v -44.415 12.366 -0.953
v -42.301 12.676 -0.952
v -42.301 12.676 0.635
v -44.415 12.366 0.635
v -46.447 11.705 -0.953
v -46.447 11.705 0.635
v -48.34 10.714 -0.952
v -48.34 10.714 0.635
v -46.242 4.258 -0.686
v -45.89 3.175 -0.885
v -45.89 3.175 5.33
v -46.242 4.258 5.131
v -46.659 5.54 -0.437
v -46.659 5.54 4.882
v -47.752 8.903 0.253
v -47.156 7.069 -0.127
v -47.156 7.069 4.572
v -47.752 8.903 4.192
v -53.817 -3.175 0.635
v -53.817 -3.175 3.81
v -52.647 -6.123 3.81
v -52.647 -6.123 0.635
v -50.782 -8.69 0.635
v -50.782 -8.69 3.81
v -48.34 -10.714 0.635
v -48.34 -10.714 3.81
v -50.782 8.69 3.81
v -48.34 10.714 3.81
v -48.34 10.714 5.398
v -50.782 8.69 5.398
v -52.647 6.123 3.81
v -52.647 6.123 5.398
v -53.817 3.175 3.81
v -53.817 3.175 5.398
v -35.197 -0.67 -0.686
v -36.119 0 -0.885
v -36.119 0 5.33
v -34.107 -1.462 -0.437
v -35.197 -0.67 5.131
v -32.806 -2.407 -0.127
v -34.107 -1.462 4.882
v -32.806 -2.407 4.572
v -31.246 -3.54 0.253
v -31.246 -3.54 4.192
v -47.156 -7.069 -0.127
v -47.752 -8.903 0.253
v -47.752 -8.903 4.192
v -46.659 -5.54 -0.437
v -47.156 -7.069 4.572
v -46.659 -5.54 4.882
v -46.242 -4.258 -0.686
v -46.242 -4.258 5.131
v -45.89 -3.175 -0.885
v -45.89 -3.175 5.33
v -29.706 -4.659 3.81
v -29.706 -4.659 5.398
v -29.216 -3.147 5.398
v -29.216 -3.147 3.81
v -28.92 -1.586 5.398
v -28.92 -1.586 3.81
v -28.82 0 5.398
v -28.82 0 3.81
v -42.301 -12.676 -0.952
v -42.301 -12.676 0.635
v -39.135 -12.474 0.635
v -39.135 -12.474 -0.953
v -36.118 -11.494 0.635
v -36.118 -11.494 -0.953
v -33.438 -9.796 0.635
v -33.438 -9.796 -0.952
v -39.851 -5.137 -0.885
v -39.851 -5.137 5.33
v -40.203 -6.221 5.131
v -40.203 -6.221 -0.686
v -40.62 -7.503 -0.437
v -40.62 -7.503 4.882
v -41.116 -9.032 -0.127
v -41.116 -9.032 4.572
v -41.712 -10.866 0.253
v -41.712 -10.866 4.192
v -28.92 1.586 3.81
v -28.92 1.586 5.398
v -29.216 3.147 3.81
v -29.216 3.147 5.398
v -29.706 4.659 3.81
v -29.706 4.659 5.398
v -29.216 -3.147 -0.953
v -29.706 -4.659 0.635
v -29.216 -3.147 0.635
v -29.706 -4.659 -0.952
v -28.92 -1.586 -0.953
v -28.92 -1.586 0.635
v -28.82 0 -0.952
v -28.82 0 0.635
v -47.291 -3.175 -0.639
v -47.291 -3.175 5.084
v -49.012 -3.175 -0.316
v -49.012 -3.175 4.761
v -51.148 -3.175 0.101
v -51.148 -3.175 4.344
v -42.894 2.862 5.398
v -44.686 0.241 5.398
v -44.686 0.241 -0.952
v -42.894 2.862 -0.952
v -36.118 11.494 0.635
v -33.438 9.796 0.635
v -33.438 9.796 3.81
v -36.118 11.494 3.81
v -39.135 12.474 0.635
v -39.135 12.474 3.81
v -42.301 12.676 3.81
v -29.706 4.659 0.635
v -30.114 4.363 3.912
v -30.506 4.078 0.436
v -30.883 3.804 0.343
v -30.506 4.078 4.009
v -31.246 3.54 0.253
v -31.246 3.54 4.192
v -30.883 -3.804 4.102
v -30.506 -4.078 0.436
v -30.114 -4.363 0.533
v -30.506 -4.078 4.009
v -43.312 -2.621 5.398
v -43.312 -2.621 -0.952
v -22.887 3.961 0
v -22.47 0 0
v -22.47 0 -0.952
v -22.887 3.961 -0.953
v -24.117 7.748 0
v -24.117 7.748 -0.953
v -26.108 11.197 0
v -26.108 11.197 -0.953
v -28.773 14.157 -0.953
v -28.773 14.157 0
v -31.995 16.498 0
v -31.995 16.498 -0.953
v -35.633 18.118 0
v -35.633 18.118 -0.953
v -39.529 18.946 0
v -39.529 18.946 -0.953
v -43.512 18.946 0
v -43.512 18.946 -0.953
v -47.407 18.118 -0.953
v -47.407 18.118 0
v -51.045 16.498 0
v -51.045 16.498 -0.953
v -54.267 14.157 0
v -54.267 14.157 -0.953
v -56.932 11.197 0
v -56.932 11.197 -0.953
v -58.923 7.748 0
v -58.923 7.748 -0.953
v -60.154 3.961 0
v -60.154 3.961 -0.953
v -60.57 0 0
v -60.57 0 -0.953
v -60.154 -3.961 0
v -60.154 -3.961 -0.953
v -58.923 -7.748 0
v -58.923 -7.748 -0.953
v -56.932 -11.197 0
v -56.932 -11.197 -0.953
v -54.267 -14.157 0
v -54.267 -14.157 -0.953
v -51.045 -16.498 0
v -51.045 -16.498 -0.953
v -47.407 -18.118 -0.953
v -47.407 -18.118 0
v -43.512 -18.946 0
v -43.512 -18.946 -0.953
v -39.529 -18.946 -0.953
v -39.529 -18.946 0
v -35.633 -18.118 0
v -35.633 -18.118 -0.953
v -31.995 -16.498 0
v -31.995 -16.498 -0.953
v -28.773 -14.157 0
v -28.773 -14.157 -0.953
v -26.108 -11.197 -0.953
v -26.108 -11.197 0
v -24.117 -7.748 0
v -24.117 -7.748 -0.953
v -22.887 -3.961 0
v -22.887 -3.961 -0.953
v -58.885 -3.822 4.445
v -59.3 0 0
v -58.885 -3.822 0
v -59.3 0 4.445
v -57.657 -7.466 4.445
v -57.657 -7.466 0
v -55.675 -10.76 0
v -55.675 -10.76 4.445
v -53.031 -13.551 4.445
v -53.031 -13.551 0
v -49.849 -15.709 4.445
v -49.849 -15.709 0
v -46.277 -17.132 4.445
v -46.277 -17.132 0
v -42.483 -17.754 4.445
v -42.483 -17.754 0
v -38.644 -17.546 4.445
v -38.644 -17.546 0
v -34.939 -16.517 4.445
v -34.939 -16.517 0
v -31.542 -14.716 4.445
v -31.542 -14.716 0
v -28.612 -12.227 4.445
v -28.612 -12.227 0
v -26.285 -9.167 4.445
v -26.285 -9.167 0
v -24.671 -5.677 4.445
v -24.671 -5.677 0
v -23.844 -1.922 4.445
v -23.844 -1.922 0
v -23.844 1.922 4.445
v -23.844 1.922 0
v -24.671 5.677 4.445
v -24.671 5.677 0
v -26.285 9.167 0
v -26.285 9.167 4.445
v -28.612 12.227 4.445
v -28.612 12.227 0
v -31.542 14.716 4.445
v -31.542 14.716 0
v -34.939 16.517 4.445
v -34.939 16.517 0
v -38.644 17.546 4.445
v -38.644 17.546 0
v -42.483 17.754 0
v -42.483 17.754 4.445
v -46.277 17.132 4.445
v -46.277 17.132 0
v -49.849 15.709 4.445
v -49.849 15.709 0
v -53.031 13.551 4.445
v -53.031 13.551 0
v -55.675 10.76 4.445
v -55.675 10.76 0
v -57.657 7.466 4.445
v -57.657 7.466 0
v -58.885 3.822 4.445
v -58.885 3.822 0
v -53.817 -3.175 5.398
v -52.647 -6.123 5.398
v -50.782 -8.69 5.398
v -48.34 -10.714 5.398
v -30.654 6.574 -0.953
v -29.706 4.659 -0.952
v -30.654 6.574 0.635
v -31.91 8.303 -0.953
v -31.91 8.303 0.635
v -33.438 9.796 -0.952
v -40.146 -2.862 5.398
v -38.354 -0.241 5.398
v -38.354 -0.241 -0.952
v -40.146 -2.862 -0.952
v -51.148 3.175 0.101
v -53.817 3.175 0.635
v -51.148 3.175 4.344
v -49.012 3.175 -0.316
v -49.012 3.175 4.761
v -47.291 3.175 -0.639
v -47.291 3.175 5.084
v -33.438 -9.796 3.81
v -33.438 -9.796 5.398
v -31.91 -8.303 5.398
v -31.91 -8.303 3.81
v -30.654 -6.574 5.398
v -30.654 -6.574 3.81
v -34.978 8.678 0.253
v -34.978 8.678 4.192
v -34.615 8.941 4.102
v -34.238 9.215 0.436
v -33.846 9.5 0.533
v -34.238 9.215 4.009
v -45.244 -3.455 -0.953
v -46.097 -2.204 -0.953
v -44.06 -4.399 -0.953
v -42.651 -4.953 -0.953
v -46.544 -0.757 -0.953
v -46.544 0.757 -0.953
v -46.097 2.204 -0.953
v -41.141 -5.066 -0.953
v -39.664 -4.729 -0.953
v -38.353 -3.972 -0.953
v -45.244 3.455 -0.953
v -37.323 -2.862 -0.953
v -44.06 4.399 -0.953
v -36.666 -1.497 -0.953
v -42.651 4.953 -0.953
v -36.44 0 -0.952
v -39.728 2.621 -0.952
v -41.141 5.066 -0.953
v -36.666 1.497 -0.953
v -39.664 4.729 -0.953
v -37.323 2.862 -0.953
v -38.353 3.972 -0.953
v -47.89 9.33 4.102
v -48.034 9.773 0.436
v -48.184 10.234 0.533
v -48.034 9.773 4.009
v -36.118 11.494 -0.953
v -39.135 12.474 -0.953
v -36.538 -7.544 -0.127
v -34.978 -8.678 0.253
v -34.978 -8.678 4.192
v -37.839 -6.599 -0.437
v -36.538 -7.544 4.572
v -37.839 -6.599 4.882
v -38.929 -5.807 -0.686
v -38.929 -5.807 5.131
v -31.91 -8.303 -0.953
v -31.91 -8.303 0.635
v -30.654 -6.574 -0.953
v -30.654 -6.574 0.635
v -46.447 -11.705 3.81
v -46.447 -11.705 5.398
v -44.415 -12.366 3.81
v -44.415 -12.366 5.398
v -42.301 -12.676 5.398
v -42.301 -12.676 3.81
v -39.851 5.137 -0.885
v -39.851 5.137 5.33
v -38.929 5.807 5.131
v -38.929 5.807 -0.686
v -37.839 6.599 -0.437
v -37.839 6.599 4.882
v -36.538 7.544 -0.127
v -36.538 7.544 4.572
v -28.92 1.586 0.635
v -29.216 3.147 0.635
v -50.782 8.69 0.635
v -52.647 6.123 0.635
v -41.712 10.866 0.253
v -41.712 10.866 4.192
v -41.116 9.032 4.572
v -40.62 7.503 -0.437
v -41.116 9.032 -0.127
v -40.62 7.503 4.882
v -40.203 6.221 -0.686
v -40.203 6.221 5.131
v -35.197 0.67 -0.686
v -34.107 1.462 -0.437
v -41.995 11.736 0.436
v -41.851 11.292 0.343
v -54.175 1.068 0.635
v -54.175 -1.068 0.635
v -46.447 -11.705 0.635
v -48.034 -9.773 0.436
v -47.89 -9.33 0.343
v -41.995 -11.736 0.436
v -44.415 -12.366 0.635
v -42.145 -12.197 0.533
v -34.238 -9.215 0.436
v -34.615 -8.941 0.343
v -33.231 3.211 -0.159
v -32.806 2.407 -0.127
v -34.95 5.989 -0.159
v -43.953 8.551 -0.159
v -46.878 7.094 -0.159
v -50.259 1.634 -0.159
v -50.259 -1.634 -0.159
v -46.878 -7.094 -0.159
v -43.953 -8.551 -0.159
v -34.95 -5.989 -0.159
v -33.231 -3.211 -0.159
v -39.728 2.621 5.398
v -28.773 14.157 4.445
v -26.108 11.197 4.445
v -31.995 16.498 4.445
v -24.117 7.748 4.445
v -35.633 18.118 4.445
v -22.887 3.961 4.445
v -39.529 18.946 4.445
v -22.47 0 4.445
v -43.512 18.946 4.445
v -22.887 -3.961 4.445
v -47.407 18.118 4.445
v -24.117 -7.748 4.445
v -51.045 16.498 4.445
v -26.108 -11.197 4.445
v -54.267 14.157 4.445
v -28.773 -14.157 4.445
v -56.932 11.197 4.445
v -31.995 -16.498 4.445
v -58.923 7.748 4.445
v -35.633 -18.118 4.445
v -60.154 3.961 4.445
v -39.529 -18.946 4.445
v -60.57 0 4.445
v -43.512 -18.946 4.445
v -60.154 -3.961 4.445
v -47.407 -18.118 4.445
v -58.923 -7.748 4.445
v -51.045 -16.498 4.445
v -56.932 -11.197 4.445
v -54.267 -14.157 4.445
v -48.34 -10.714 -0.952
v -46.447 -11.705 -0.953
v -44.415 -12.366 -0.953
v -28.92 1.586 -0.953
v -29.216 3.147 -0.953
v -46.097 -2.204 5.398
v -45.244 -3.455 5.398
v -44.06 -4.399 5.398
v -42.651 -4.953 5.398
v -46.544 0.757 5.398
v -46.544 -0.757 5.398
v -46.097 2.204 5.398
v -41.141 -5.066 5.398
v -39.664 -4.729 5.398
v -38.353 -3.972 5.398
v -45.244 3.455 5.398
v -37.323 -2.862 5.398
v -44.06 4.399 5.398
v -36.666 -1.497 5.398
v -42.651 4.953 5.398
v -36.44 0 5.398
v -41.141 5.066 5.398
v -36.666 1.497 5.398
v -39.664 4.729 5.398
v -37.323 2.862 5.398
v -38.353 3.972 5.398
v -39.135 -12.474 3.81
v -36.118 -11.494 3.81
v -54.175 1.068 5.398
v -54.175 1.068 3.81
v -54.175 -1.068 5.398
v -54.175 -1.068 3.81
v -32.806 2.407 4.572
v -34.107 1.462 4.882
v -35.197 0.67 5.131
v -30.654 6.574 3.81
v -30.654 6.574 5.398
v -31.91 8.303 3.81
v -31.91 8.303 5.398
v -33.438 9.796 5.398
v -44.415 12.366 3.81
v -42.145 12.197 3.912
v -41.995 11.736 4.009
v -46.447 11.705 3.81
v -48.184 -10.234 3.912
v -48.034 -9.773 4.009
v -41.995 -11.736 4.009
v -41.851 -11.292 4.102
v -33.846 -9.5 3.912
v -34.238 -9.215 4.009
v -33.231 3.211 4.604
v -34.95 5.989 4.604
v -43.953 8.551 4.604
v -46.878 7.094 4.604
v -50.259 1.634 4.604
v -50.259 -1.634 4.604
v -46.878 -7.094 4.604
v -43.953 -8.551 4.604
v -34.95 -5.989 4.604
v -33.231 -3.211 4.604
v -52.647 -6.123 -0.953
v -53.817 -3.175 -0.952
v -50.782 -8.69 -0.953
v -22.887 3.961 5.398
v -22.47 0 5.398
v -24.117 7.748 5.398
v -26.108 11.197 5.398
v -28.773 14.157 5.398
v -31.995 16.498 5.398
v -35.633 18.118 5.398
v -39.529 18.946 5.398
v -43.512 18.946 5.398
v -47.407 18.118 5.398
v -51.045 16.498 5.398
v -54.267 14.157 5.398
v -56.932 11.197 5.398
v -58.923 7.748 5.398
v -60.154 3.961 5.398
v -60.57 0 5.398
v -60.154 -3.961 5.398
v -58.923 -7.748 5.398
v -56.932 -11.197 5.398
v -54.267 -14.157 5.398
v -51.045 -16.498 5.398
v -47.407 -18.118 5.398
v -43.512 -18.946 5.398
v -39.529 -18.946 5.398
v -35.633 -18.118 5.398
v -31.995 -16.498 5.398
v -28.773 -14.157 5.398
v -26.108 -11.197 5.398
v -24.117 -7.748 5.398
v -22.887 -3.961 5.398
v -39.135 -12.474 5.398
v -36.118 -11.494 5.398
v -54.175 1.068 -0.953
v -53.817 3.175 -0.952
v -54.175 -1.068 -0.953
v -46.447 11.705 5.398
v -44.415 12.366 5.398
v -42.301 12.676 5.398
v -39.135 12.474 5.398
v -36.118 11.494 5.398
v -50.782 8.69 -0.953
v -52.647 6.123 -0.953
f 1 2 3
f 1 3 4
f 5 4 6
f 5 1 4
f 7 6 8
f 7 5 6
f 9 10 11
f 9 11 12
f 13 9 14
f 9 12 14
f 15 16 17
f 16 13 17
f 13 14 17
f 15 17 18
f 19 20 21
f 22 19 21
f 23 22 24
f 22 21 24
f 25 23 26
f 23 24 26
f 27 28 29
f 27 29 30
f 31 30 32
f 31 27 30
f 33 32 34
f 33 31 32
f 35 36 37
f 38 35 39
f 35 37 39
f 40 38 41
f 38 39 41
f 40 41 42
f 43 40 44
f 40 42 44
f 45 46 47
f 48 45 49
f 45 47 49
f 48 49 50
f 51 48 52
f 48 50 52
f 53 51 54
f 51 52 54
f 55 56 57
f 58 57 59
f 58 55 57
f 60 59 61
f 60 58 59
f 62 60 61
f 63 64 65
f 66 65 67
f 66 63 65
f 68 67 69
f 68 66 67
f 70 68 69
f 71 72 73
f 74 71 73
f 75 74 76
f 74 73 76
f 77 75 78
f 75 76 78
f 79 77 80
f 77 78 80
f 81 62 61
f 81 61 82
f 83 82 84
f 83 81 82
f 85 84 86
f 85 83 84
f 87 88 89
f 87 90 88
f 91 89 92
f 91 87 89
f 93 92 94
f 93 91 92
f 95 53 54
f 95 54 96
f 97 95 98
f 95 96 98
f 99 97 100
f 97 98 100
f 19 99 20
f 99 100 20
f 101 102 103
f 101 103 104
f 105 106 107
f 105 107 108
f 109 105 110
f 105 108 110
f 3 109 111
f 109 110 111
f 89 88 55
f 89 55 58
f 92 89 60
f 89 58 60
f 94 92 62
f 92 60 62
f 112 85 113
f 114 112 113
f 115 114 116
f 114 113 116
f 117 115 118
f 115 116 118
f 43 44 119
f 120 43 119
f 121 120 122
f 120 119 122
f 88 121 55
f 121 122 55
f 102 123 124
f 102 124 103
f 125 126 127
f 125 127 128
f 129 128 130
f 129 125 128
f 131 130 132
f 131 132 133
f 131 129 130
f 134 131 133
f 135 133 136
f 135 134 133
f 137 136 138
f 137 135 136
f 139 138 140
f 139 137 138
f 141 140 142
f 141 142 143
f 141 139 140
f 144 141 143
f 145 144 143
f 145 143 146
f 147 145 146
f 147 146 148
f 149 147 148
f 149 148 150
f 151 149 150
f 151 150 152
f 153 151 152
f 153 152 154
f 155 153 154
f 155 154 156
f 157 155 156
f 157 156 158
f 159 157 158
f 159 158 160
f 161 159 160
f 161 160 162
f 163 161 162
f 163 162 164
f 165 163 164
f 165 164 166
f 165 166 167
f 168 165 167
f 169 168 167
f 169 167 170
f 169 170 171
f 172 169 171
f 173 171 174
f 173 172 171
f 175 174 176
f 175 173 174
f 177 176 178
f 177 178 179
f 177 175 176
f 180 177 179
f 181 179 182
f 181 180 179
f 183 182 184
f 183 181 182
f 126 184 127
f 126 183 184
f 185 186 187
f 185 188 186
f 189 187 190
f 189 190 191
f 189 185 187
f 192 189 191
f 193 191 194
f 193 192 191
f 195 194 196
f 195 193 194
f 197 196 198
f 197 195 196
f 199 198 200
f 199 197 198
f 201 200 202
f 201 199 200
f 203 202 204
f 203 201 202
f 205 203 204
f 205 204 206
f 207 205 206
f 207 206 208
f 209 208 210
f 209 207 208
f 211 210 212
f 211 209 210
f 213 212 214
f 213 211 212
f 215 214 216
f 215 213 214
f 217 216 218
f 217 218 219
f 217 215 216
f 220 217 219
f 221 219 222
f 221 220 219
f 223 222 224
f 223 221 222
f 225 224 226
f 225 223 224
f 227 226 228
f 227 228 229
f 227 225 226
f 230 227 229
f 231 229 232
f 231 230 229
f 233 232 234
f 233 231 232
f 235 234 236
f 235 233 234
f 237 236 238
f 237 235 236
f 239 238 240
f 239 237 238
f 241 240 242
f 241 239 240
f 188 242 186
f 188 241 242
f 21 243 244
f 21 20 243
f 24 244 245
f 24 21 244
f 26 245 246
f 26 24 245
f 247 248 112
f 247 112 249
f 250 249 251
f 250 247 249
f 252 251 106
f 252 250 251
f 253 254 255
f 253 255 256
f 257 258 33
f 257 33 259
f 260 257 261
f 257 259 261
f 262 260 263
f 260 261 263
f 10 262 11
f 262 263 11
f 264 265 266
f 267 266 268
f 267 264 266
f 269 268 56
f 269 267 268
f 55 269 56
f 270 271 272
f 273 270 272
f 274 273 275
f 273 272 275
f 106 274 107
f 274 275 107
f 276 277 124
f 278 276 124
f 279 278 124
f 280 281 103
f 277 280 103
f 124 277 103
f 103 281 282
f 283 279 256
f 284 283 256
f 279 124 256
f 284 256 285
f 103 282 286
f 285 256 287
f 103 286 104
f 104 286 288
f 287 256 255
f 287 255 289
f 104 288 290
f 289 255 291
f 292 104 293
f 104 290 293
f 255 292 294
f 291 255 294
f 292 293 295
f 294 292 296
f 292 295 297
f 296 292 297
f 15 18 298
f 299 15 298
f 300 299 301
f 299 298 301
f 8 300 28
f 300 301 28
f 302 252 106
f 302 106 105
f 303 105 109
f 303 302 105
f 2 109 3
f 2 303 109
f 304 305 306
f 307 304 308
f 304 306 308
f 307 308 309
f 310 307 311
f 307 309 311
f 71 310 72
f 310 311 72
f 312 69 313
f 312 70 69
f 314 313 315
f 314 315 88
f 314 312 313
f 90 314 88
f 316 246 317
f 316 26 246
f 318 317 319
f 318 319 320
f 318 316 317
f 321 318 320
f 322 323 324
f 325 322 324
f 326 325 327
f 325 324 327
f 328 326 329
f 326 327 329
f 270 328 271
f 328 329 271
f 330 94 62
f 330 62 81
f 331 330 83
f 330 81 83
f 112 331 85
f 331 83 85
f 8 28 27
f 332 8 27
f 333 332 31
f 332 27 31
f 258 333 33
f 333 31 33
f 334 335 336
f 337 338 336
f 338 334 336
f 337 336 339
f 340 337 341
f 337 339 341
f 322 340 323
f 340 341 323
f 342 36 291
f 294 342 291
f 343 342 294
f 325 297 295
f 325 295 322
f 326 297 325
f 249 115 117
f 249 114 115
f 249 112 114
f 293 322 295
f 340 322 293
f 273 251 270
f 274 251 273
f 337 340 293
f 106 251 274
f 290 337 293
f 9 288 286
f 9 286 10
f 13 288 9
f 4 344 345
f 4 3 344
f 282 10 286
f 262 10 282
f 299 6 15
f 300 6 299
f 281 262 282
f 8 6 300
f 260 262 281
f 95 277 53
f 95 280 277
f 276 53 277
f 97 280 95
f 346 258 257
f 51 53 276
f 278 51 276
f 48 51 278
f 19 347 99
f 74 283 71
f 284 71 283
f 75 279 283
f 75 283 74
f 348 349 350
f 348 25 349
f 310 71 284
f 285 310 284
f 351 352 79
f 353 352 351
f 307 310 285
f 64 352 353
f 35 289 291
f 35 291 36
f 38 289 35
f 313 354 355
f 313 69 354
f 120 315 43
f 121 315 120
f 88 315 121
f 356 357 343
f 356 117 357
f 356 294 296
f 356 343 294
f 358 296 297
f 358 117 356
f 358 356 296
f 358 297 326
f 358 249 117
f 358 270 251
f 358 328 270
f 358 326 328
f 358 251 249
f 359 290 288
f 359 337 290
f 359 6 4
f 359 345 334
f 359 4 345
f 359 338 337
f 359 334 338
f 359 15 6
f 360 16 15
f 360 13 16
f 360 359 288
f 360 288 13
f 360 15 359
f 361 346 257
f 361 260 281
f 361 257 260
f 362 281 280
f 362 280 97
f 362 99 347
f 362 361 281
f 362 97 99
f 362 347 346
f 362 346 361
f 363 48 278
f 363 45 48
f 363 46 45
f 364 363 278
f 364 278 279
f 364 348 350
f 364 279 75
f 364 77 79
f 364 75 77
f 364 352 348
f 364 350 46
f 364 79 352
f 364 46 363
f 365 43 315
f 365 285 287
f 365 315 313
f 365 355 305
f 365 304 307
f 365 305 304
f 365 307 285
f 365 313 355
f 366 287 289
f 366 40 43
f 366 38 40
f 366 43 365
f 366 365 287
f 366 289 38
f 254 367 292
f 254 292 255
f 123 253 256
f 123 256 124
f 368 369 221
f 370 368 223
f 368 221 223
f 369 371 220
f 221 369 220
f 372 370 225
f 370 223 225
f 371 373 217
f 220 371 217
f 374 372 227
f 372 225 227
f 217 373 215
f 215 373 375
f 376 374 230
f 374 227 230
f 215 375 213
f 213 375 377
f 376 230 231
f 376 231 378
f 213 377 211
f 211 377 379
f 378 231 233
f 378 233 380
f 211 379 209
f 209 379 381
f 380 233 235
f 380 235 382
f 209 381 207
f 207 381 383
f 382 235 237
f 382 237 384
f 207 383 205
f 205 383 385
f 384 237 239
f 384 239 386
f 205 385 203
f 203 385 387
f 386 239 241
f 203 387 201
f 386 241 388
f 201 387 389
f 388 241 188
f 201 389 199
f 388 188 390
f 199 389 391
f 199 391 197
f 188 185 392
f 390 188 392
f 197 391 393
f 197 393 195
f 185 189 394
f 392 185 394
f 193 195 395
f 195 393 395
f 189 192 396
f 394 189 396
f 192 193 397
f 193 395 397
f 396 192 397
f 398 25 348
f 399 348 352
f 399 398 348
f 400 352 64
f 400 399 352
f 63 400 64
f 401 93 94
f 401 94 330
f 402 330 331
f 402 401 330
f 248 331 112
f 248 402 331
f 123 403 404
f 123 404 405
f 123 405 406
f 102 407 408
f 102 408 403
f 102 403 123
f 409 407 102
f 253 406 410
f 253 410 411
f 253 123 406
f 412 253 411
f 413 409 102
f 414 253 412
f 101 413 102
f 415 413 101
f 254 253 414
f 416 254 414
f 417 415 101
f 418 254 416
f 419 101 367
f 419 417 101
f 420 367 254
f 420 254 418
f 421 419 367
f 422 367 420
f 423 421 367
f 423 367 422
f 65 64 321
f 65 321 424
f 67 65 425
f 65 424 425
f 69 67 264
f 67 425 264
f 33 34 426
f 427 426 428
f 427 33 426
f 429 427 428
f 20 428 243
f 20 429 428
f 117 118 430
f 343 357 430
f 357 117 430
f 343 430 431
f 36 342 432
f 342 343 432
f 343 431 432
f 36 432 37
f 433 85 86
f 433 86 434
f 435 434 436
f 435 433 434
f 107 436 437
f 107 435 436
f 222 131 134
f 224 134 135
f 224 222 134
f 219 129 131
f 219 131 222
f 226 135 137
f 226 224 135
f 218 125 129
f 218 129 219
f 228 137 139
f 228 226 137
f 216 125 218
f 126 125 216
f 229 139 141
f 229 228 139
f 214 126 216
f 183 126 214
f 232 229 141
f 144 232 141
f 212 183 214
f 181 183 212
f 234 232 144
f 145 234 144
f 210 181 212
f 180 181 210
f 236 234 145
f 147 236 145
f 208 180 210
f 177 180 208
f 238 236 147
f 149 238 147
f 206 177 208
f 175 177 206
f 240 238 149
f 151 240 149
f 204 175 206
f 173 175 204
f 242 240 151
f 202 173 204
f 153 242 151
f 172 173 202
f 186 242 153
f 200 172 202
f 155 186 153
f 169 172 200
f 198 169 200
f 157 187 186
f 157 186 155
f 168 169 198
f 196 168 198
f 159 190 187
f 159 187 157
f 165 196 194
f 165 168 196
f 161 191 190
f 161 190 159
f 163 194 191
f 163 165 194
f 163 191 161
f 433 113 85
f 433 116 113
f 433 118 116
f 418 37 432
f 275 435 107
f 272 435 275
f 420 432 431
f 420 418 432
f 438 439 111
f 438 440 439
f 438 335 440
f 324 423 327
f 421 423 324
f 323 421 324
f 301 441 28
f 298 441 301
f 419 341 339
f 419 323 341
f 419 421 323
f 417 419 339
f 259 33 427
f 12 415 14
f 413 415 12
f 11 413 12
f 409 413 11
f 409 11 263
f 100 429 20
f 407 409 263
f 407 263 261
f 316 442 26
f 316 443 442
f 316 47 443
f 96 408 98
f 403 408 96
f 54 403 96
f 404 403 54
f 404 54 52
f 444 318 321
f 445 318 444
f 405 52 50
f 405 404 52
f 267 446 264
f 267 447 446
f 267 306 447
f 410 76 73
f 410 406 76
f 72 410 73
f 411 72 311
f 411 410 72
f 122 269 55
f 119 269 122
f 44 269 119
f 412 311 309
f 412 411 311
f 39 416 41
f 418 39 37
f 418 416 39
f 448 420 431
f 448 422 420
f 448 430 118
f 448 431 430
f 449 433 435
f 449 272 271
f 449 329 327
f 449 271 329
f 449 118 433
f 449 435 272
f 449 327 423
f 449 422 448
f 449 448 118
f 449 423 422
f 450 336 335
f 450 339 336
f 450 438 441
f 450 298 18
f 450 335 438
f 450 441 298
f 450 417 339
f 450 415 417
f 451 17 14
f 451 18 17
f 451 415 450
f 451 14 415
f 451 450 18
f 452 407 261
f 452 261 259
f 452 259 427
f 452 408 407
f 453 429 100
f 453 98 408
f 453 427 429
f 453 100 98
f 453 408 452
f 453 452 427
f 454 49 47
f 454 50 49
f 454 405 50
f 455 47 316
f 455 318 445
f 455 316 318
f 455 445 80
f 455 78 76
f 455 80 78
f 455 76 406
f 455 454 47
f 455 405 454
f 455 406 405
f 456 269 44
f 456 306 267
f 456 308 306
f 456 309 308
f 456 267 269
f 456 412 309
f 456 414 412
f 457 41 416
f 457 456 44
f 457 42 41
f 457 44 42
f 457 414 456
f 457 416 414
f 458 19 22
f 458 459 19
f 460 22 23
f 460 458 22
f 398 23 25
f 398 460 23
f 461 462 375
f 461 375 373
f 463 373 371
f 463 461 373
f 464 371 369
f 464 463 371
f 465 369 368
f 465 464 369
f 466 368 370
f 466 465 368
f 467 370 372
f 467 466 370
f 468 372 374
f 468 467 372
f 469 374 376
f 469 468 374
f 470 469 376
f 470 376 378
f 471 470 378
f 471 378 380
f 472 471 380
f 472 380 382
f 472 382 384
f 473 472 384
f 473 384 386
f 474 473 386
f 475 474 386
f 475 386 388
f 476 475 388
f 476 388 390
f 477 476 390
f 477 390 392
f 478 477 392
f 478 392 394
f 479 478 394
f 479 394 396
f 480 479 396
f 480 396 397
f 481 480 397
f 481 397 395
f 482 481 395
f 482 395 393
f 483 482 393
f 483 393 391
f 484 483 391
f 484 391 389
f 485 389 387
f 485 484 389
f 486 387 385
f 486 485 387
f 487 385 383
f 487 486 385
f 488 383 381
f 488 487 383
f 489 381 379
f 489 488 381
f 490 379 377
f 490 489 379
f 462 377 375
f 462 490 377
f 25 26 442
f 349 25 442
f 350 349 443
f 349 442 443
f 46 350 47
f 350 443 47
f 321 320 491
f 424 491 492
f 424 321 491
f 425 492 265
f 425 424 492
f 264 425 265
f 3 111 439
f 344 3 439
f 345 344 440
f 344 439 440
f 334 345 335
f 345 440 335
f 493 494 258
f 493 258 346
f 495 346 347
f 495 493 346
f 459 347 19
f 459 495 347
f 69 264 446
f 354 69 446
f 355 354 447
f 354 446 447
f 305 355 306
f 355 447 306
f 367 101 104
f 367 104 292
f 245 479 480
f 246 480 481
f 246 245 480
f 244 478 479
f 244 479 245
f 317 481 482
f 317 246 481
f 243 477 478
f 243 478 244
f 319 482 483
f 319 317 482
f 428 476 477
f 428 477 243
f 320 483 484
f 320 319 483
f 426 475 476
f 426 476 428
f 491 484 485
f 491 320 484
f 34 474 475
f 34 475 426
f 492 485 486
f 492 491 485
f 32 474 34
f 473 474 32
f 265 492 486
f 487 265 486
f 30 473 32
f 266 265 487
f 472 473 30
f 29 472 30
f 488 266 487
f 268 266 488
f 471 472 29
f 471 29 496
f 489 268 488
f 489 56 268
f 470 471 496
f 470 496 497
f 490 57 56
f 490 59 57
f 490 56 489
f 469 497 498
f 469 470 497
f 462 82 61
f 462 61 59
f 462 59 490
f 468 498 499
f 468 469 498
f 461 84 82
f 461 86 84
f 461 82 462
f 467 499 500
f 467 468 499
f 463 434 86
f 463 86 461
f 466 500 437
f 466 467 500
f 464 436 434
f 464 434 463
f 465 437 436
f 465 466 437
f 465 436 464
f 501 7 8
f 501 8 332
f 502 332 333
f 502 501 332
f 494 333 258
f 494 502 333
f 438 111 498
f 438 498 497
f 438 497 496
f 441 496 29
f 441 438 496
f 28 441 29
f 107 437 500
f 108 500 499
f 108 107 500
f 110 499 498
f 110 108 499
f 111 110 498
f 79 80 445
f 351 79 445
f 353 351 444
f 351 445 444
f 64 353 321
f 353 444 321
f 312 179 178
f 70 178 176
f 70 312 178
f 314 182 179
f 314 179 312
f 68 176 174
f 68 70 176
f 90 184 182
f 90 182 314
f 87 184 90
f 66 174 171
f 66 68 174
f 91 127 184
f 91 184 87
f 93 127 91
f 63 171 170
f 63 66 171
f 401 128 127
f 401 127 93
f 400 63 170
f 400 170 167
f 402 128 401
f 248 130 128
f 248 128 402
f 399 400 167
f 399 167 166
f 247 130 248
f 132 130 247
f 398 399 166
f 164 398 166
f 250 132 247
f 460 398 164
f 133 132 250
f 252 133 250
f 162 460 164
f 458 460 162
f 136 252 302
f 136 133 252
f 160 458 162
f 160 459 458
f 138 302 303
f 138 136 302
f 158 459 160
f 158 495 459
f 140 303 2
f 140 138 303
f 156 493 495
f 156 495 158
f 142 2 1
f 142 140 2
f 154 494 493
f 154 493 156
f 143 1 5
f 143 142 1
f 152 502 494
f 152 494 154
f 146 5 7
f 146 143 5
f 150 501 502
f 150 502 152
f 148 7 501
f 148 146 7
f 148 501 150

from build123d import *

# Parameters (mm, degrees)
F0_W     = 1.27
F0_H     = 2.2225
F0_W_2   = 7.62
F0_H_2   = 1.5875
F3_DEPTH = 25.4
F6_DEPTH = 6.35


# Not quite as in the source:
# - after a boolean that leaves OpenCascade's solid faulty, fix() repairs it


with BuildPart() as f1:
    # F0 (on Front) → F1 (revolve)
    with BuildSketch(Plane.XZ):
        with Locations((-59.9352485356, 1.11125)):
            Rectangle(F0_W, F0_H)
        with Locations((-59.9352485356, 3.33375)):
            Rectangle(F0_W, F0_H)
        Polygon((-22.4702485356, 5.3975), (-28.8202485356, 5.3975), (-28.8202485356, 3.81), (-28.8202485356, 2.2225), (-22.4702485356, 2.2225), align=None)
        with Locations((-32.6302485356, 3.01625)):
            Rectangle(F0_W_2, F0_H_2)
        Polygon((-36.4402485356, 3.81), (-28.8202485356, 3.81), (-36.4402485356, 5.3975), align=None)
        Polygon((-22.4702485356, -0.9525), (-22.4702485356, 2.2225), (-28.8202485356, 2.2225), (-28.8202485356, 0.635), (-28.8202485356, -0.9525), align=None)
        with Locations((-32.6302485356, 1.42875)):
            Rectangle(F0_W_2, F0_H_2)
        Polygon((-36.4402485356, 2.2225), (-36.4402485356, 3.81), (-36.4402485356, 5.3975), (-38.3452485356, 5.3975), (-38.3452485356, 2.2225), align=None)
        Polygon((-36.4402485356, -0.9525), (-28.8202485356, 0.635), (-36.4402485356, 0.635), align=None)
        Polygon((-36.4402485356, 0.635), (-36.4402485356, 2.2225), (-38.3452485356, 2.2225), (-38.3452485356, -0.9525), (-36.4402485356, -0.9525), align=None)
    revolve(axis=Axis((-41.5202485356, 0, 2.0941267129), (0, 0, 1)))

    add(f1.part.fix(), mode=Mode.REPLACE)

    # F2 (on face) → F3 (cut)
    with BuildSketch(Plane.XY.offset(5.3975)):
        with BuildLine():
            Line((-41.7123280121, 10.8656756712), (-34.9781690591, 8.6776147898))
            Line((-34.9781690591, 8.6776147898), (-33.438209538, 9.7964608733))
            ThreePointArc((-33.438209538, 9.7964608733), (-37.595732707, 12.0784177569), (-42.3005402078, 12.6760066624))
            Line((-42.3005402078, 12.6760066624), (-41.7123280121, 10.8656756712))
        make_face()
        Polygon((-39.8510522546, 5.1372579143), (-34.9781690591, 8.6776147898), (-41.7123280121, 10.8656756712), align=None)
        with BuildLine():
            Line((-51.9134760092, 3.175), (-47.7515368906, 8.9034177569))
            Line((-47.7515368906, 8.9034177569), (-48.3397490863, 10.7137487482))
            ThreePointArc((-48.3397490863, 10.7137487482), (-51.7947643642, 7.4648727041), (-53.8169706598, 3.175))
            Line((-53.8169706598, 3.175), (-51.9134760092, 3.175))
        make_face()
        Polygon((-45.8902611331, 3.175), (-47.7515368906, 8.9034177569), (-51.9134760092, 3.175), align=None)
        with BuildLine():
            Line((-48.3397490863, -10.7137487482), (-47.7515368906, -8.9034177569))
            Line((-47.7515368906, -8.9034177569), (-51.9134760092, -3.175))
            Line((-51.9134760092, -3.175), (-53.8169706598, -3.175))
            ThreePointArc((-53.8169706598, -3.175), (-51.7947643642, -7.4648727041), (-48.3397490863, -10.7137487482))
        make_face()
        Polygon((-51.9134760092, -3.175), (-47.7515368906, -8.9034177569), (-45.8902611331, -3.175), align=None)
        Polygon((-41.7123280121, -10.8656756712), (-34.9781690591, -8.6776147898), (-39.8510522546, -5.1372579143), align=None)
        with BuildLine():
            Line((-33.438209538, -9.7964608733), (-34.9781690591, -8.6776147898))
            Line((-34.9781690591, -8.6776147898), (-41.7123280121, -10.8656756712))
            Line((-41.7123280121, -10.8656756712), (-42.3005402078, -12.6760066624))
            ThreePointArc((-42.3005402078, -12.6760066624), (-37.595732707, -12.0784177569), (-33.438209538, -9.7964608733))
        make_face()
        Polygon((-31.245732707, -3.5403568756), (-31.245732707, 3.5403568756), (-36.1186159026, 0), align=None)
        with BuildLine():
            Line((-29.705773186, 4.659202959), (-31.245732707, 3.5403568756))
            Line((-31.245732707, 3.5403568756), (-31.245732707, -3.5403568756))
            Line((-31.245732707, -3.5403568756), (-29.705773186, -4.659202959))
            ThreePointArc((-29.705773186, -4.659202959), (-29.0435935965, -2.3713037616), (-28.8202485356, 0))
            ThreePointArc((-28.8202485356, 0), (-29.0435935965, 2.3713037616), (-29.705773186, 4.659202959))
        make_face()
    extrude(amount=-F3_DEPTH, mode=Mode.SUBTRACT)

    # F0 (on Front) → F4 (revolve, cut)
    with BuildSketch(Plane.XZ):
        with Locations((-59.9352485356, 3.33375)):
            Rectangle(F0_W, F0_H)
        with Locations((-59.9352485356, 1.11125)):
            Rectangle(F0_W, F0_H)
    revolve(axis=Axis((-41.5202485356, 0, 2.0941267129), (0, 0, 1)), mode=Mode.SUBTRACT)

    add(f1.part.fix(), mode=Mode.REPLACE)

    # F5 (on face) → F6 (join)
    with BuildSketch(Plane.XY.offset(5.3975)):
        with BuildLine():
            Line((-44.6860680874, 0.2412707303), (-42.8942117298, 2.8623155208))
            ThreePointArc((-42.8942117298, 2.8623155208), (-44.1412933261, 1.7918563576), (-44.6860680874, 0.2412707303))
        make_face()
        with BuildLine():
            Line((-43.3121048932, -2.6210447905), (-44.6860680874, 0.2412707303))
            ThreePointArc((-44.6860680874, 0.2412707303), (-44.3825640564, -1.3739631943), (-43.3121048932, -2.6210447905))
        make_face()
        with BuildLine():
            ThreePointArc((-43.3121048932, -2.6210447905), (-41.7615192659, -3.1658195518), (-40.1462853413, -2.8623155208))
            Line((-40.1462853413, -2.8623155208), (-43.3121048932, -2.6210447905))
        make_face()
        with BuildLine():
            ThreePointArc((-40.1462853413, -2.8623155208), (-38.8992037451, -1.7918563576), (-38.3544289838, -0.2412707303))
            Line((-38.3544289838, -0.2412707303), (-40.1462853413, -2.8623155208))
        make_face()
        with BuildLine():
            ThreePointArc((-38.3544289838, -0.2412707303), (-38.3475444778, -0.1207226635), (-38.3452485356, 0))
            ThreePointArc((-38.3452485356, 0), (-38.7122448911, 1.4818031355), (-39.728392178, 2.6210447905))
            Line((-39.728392178, 2.6210447905), (-38.3544289838, -0.2412707303))
        make_face()
        with BuildLine():
            Line((-42.8942117298, 2.8623155208), (-39.728392178, 2.6210447905))
            ThreePointArc((-39.728392178, 2.6210447905), (-41.2789778053, 3.1658195518), (-42.8942117298, 2.8623155208))
        make_face()
    extrude(amount=-F6_DEPTH)


solid = f1.part
